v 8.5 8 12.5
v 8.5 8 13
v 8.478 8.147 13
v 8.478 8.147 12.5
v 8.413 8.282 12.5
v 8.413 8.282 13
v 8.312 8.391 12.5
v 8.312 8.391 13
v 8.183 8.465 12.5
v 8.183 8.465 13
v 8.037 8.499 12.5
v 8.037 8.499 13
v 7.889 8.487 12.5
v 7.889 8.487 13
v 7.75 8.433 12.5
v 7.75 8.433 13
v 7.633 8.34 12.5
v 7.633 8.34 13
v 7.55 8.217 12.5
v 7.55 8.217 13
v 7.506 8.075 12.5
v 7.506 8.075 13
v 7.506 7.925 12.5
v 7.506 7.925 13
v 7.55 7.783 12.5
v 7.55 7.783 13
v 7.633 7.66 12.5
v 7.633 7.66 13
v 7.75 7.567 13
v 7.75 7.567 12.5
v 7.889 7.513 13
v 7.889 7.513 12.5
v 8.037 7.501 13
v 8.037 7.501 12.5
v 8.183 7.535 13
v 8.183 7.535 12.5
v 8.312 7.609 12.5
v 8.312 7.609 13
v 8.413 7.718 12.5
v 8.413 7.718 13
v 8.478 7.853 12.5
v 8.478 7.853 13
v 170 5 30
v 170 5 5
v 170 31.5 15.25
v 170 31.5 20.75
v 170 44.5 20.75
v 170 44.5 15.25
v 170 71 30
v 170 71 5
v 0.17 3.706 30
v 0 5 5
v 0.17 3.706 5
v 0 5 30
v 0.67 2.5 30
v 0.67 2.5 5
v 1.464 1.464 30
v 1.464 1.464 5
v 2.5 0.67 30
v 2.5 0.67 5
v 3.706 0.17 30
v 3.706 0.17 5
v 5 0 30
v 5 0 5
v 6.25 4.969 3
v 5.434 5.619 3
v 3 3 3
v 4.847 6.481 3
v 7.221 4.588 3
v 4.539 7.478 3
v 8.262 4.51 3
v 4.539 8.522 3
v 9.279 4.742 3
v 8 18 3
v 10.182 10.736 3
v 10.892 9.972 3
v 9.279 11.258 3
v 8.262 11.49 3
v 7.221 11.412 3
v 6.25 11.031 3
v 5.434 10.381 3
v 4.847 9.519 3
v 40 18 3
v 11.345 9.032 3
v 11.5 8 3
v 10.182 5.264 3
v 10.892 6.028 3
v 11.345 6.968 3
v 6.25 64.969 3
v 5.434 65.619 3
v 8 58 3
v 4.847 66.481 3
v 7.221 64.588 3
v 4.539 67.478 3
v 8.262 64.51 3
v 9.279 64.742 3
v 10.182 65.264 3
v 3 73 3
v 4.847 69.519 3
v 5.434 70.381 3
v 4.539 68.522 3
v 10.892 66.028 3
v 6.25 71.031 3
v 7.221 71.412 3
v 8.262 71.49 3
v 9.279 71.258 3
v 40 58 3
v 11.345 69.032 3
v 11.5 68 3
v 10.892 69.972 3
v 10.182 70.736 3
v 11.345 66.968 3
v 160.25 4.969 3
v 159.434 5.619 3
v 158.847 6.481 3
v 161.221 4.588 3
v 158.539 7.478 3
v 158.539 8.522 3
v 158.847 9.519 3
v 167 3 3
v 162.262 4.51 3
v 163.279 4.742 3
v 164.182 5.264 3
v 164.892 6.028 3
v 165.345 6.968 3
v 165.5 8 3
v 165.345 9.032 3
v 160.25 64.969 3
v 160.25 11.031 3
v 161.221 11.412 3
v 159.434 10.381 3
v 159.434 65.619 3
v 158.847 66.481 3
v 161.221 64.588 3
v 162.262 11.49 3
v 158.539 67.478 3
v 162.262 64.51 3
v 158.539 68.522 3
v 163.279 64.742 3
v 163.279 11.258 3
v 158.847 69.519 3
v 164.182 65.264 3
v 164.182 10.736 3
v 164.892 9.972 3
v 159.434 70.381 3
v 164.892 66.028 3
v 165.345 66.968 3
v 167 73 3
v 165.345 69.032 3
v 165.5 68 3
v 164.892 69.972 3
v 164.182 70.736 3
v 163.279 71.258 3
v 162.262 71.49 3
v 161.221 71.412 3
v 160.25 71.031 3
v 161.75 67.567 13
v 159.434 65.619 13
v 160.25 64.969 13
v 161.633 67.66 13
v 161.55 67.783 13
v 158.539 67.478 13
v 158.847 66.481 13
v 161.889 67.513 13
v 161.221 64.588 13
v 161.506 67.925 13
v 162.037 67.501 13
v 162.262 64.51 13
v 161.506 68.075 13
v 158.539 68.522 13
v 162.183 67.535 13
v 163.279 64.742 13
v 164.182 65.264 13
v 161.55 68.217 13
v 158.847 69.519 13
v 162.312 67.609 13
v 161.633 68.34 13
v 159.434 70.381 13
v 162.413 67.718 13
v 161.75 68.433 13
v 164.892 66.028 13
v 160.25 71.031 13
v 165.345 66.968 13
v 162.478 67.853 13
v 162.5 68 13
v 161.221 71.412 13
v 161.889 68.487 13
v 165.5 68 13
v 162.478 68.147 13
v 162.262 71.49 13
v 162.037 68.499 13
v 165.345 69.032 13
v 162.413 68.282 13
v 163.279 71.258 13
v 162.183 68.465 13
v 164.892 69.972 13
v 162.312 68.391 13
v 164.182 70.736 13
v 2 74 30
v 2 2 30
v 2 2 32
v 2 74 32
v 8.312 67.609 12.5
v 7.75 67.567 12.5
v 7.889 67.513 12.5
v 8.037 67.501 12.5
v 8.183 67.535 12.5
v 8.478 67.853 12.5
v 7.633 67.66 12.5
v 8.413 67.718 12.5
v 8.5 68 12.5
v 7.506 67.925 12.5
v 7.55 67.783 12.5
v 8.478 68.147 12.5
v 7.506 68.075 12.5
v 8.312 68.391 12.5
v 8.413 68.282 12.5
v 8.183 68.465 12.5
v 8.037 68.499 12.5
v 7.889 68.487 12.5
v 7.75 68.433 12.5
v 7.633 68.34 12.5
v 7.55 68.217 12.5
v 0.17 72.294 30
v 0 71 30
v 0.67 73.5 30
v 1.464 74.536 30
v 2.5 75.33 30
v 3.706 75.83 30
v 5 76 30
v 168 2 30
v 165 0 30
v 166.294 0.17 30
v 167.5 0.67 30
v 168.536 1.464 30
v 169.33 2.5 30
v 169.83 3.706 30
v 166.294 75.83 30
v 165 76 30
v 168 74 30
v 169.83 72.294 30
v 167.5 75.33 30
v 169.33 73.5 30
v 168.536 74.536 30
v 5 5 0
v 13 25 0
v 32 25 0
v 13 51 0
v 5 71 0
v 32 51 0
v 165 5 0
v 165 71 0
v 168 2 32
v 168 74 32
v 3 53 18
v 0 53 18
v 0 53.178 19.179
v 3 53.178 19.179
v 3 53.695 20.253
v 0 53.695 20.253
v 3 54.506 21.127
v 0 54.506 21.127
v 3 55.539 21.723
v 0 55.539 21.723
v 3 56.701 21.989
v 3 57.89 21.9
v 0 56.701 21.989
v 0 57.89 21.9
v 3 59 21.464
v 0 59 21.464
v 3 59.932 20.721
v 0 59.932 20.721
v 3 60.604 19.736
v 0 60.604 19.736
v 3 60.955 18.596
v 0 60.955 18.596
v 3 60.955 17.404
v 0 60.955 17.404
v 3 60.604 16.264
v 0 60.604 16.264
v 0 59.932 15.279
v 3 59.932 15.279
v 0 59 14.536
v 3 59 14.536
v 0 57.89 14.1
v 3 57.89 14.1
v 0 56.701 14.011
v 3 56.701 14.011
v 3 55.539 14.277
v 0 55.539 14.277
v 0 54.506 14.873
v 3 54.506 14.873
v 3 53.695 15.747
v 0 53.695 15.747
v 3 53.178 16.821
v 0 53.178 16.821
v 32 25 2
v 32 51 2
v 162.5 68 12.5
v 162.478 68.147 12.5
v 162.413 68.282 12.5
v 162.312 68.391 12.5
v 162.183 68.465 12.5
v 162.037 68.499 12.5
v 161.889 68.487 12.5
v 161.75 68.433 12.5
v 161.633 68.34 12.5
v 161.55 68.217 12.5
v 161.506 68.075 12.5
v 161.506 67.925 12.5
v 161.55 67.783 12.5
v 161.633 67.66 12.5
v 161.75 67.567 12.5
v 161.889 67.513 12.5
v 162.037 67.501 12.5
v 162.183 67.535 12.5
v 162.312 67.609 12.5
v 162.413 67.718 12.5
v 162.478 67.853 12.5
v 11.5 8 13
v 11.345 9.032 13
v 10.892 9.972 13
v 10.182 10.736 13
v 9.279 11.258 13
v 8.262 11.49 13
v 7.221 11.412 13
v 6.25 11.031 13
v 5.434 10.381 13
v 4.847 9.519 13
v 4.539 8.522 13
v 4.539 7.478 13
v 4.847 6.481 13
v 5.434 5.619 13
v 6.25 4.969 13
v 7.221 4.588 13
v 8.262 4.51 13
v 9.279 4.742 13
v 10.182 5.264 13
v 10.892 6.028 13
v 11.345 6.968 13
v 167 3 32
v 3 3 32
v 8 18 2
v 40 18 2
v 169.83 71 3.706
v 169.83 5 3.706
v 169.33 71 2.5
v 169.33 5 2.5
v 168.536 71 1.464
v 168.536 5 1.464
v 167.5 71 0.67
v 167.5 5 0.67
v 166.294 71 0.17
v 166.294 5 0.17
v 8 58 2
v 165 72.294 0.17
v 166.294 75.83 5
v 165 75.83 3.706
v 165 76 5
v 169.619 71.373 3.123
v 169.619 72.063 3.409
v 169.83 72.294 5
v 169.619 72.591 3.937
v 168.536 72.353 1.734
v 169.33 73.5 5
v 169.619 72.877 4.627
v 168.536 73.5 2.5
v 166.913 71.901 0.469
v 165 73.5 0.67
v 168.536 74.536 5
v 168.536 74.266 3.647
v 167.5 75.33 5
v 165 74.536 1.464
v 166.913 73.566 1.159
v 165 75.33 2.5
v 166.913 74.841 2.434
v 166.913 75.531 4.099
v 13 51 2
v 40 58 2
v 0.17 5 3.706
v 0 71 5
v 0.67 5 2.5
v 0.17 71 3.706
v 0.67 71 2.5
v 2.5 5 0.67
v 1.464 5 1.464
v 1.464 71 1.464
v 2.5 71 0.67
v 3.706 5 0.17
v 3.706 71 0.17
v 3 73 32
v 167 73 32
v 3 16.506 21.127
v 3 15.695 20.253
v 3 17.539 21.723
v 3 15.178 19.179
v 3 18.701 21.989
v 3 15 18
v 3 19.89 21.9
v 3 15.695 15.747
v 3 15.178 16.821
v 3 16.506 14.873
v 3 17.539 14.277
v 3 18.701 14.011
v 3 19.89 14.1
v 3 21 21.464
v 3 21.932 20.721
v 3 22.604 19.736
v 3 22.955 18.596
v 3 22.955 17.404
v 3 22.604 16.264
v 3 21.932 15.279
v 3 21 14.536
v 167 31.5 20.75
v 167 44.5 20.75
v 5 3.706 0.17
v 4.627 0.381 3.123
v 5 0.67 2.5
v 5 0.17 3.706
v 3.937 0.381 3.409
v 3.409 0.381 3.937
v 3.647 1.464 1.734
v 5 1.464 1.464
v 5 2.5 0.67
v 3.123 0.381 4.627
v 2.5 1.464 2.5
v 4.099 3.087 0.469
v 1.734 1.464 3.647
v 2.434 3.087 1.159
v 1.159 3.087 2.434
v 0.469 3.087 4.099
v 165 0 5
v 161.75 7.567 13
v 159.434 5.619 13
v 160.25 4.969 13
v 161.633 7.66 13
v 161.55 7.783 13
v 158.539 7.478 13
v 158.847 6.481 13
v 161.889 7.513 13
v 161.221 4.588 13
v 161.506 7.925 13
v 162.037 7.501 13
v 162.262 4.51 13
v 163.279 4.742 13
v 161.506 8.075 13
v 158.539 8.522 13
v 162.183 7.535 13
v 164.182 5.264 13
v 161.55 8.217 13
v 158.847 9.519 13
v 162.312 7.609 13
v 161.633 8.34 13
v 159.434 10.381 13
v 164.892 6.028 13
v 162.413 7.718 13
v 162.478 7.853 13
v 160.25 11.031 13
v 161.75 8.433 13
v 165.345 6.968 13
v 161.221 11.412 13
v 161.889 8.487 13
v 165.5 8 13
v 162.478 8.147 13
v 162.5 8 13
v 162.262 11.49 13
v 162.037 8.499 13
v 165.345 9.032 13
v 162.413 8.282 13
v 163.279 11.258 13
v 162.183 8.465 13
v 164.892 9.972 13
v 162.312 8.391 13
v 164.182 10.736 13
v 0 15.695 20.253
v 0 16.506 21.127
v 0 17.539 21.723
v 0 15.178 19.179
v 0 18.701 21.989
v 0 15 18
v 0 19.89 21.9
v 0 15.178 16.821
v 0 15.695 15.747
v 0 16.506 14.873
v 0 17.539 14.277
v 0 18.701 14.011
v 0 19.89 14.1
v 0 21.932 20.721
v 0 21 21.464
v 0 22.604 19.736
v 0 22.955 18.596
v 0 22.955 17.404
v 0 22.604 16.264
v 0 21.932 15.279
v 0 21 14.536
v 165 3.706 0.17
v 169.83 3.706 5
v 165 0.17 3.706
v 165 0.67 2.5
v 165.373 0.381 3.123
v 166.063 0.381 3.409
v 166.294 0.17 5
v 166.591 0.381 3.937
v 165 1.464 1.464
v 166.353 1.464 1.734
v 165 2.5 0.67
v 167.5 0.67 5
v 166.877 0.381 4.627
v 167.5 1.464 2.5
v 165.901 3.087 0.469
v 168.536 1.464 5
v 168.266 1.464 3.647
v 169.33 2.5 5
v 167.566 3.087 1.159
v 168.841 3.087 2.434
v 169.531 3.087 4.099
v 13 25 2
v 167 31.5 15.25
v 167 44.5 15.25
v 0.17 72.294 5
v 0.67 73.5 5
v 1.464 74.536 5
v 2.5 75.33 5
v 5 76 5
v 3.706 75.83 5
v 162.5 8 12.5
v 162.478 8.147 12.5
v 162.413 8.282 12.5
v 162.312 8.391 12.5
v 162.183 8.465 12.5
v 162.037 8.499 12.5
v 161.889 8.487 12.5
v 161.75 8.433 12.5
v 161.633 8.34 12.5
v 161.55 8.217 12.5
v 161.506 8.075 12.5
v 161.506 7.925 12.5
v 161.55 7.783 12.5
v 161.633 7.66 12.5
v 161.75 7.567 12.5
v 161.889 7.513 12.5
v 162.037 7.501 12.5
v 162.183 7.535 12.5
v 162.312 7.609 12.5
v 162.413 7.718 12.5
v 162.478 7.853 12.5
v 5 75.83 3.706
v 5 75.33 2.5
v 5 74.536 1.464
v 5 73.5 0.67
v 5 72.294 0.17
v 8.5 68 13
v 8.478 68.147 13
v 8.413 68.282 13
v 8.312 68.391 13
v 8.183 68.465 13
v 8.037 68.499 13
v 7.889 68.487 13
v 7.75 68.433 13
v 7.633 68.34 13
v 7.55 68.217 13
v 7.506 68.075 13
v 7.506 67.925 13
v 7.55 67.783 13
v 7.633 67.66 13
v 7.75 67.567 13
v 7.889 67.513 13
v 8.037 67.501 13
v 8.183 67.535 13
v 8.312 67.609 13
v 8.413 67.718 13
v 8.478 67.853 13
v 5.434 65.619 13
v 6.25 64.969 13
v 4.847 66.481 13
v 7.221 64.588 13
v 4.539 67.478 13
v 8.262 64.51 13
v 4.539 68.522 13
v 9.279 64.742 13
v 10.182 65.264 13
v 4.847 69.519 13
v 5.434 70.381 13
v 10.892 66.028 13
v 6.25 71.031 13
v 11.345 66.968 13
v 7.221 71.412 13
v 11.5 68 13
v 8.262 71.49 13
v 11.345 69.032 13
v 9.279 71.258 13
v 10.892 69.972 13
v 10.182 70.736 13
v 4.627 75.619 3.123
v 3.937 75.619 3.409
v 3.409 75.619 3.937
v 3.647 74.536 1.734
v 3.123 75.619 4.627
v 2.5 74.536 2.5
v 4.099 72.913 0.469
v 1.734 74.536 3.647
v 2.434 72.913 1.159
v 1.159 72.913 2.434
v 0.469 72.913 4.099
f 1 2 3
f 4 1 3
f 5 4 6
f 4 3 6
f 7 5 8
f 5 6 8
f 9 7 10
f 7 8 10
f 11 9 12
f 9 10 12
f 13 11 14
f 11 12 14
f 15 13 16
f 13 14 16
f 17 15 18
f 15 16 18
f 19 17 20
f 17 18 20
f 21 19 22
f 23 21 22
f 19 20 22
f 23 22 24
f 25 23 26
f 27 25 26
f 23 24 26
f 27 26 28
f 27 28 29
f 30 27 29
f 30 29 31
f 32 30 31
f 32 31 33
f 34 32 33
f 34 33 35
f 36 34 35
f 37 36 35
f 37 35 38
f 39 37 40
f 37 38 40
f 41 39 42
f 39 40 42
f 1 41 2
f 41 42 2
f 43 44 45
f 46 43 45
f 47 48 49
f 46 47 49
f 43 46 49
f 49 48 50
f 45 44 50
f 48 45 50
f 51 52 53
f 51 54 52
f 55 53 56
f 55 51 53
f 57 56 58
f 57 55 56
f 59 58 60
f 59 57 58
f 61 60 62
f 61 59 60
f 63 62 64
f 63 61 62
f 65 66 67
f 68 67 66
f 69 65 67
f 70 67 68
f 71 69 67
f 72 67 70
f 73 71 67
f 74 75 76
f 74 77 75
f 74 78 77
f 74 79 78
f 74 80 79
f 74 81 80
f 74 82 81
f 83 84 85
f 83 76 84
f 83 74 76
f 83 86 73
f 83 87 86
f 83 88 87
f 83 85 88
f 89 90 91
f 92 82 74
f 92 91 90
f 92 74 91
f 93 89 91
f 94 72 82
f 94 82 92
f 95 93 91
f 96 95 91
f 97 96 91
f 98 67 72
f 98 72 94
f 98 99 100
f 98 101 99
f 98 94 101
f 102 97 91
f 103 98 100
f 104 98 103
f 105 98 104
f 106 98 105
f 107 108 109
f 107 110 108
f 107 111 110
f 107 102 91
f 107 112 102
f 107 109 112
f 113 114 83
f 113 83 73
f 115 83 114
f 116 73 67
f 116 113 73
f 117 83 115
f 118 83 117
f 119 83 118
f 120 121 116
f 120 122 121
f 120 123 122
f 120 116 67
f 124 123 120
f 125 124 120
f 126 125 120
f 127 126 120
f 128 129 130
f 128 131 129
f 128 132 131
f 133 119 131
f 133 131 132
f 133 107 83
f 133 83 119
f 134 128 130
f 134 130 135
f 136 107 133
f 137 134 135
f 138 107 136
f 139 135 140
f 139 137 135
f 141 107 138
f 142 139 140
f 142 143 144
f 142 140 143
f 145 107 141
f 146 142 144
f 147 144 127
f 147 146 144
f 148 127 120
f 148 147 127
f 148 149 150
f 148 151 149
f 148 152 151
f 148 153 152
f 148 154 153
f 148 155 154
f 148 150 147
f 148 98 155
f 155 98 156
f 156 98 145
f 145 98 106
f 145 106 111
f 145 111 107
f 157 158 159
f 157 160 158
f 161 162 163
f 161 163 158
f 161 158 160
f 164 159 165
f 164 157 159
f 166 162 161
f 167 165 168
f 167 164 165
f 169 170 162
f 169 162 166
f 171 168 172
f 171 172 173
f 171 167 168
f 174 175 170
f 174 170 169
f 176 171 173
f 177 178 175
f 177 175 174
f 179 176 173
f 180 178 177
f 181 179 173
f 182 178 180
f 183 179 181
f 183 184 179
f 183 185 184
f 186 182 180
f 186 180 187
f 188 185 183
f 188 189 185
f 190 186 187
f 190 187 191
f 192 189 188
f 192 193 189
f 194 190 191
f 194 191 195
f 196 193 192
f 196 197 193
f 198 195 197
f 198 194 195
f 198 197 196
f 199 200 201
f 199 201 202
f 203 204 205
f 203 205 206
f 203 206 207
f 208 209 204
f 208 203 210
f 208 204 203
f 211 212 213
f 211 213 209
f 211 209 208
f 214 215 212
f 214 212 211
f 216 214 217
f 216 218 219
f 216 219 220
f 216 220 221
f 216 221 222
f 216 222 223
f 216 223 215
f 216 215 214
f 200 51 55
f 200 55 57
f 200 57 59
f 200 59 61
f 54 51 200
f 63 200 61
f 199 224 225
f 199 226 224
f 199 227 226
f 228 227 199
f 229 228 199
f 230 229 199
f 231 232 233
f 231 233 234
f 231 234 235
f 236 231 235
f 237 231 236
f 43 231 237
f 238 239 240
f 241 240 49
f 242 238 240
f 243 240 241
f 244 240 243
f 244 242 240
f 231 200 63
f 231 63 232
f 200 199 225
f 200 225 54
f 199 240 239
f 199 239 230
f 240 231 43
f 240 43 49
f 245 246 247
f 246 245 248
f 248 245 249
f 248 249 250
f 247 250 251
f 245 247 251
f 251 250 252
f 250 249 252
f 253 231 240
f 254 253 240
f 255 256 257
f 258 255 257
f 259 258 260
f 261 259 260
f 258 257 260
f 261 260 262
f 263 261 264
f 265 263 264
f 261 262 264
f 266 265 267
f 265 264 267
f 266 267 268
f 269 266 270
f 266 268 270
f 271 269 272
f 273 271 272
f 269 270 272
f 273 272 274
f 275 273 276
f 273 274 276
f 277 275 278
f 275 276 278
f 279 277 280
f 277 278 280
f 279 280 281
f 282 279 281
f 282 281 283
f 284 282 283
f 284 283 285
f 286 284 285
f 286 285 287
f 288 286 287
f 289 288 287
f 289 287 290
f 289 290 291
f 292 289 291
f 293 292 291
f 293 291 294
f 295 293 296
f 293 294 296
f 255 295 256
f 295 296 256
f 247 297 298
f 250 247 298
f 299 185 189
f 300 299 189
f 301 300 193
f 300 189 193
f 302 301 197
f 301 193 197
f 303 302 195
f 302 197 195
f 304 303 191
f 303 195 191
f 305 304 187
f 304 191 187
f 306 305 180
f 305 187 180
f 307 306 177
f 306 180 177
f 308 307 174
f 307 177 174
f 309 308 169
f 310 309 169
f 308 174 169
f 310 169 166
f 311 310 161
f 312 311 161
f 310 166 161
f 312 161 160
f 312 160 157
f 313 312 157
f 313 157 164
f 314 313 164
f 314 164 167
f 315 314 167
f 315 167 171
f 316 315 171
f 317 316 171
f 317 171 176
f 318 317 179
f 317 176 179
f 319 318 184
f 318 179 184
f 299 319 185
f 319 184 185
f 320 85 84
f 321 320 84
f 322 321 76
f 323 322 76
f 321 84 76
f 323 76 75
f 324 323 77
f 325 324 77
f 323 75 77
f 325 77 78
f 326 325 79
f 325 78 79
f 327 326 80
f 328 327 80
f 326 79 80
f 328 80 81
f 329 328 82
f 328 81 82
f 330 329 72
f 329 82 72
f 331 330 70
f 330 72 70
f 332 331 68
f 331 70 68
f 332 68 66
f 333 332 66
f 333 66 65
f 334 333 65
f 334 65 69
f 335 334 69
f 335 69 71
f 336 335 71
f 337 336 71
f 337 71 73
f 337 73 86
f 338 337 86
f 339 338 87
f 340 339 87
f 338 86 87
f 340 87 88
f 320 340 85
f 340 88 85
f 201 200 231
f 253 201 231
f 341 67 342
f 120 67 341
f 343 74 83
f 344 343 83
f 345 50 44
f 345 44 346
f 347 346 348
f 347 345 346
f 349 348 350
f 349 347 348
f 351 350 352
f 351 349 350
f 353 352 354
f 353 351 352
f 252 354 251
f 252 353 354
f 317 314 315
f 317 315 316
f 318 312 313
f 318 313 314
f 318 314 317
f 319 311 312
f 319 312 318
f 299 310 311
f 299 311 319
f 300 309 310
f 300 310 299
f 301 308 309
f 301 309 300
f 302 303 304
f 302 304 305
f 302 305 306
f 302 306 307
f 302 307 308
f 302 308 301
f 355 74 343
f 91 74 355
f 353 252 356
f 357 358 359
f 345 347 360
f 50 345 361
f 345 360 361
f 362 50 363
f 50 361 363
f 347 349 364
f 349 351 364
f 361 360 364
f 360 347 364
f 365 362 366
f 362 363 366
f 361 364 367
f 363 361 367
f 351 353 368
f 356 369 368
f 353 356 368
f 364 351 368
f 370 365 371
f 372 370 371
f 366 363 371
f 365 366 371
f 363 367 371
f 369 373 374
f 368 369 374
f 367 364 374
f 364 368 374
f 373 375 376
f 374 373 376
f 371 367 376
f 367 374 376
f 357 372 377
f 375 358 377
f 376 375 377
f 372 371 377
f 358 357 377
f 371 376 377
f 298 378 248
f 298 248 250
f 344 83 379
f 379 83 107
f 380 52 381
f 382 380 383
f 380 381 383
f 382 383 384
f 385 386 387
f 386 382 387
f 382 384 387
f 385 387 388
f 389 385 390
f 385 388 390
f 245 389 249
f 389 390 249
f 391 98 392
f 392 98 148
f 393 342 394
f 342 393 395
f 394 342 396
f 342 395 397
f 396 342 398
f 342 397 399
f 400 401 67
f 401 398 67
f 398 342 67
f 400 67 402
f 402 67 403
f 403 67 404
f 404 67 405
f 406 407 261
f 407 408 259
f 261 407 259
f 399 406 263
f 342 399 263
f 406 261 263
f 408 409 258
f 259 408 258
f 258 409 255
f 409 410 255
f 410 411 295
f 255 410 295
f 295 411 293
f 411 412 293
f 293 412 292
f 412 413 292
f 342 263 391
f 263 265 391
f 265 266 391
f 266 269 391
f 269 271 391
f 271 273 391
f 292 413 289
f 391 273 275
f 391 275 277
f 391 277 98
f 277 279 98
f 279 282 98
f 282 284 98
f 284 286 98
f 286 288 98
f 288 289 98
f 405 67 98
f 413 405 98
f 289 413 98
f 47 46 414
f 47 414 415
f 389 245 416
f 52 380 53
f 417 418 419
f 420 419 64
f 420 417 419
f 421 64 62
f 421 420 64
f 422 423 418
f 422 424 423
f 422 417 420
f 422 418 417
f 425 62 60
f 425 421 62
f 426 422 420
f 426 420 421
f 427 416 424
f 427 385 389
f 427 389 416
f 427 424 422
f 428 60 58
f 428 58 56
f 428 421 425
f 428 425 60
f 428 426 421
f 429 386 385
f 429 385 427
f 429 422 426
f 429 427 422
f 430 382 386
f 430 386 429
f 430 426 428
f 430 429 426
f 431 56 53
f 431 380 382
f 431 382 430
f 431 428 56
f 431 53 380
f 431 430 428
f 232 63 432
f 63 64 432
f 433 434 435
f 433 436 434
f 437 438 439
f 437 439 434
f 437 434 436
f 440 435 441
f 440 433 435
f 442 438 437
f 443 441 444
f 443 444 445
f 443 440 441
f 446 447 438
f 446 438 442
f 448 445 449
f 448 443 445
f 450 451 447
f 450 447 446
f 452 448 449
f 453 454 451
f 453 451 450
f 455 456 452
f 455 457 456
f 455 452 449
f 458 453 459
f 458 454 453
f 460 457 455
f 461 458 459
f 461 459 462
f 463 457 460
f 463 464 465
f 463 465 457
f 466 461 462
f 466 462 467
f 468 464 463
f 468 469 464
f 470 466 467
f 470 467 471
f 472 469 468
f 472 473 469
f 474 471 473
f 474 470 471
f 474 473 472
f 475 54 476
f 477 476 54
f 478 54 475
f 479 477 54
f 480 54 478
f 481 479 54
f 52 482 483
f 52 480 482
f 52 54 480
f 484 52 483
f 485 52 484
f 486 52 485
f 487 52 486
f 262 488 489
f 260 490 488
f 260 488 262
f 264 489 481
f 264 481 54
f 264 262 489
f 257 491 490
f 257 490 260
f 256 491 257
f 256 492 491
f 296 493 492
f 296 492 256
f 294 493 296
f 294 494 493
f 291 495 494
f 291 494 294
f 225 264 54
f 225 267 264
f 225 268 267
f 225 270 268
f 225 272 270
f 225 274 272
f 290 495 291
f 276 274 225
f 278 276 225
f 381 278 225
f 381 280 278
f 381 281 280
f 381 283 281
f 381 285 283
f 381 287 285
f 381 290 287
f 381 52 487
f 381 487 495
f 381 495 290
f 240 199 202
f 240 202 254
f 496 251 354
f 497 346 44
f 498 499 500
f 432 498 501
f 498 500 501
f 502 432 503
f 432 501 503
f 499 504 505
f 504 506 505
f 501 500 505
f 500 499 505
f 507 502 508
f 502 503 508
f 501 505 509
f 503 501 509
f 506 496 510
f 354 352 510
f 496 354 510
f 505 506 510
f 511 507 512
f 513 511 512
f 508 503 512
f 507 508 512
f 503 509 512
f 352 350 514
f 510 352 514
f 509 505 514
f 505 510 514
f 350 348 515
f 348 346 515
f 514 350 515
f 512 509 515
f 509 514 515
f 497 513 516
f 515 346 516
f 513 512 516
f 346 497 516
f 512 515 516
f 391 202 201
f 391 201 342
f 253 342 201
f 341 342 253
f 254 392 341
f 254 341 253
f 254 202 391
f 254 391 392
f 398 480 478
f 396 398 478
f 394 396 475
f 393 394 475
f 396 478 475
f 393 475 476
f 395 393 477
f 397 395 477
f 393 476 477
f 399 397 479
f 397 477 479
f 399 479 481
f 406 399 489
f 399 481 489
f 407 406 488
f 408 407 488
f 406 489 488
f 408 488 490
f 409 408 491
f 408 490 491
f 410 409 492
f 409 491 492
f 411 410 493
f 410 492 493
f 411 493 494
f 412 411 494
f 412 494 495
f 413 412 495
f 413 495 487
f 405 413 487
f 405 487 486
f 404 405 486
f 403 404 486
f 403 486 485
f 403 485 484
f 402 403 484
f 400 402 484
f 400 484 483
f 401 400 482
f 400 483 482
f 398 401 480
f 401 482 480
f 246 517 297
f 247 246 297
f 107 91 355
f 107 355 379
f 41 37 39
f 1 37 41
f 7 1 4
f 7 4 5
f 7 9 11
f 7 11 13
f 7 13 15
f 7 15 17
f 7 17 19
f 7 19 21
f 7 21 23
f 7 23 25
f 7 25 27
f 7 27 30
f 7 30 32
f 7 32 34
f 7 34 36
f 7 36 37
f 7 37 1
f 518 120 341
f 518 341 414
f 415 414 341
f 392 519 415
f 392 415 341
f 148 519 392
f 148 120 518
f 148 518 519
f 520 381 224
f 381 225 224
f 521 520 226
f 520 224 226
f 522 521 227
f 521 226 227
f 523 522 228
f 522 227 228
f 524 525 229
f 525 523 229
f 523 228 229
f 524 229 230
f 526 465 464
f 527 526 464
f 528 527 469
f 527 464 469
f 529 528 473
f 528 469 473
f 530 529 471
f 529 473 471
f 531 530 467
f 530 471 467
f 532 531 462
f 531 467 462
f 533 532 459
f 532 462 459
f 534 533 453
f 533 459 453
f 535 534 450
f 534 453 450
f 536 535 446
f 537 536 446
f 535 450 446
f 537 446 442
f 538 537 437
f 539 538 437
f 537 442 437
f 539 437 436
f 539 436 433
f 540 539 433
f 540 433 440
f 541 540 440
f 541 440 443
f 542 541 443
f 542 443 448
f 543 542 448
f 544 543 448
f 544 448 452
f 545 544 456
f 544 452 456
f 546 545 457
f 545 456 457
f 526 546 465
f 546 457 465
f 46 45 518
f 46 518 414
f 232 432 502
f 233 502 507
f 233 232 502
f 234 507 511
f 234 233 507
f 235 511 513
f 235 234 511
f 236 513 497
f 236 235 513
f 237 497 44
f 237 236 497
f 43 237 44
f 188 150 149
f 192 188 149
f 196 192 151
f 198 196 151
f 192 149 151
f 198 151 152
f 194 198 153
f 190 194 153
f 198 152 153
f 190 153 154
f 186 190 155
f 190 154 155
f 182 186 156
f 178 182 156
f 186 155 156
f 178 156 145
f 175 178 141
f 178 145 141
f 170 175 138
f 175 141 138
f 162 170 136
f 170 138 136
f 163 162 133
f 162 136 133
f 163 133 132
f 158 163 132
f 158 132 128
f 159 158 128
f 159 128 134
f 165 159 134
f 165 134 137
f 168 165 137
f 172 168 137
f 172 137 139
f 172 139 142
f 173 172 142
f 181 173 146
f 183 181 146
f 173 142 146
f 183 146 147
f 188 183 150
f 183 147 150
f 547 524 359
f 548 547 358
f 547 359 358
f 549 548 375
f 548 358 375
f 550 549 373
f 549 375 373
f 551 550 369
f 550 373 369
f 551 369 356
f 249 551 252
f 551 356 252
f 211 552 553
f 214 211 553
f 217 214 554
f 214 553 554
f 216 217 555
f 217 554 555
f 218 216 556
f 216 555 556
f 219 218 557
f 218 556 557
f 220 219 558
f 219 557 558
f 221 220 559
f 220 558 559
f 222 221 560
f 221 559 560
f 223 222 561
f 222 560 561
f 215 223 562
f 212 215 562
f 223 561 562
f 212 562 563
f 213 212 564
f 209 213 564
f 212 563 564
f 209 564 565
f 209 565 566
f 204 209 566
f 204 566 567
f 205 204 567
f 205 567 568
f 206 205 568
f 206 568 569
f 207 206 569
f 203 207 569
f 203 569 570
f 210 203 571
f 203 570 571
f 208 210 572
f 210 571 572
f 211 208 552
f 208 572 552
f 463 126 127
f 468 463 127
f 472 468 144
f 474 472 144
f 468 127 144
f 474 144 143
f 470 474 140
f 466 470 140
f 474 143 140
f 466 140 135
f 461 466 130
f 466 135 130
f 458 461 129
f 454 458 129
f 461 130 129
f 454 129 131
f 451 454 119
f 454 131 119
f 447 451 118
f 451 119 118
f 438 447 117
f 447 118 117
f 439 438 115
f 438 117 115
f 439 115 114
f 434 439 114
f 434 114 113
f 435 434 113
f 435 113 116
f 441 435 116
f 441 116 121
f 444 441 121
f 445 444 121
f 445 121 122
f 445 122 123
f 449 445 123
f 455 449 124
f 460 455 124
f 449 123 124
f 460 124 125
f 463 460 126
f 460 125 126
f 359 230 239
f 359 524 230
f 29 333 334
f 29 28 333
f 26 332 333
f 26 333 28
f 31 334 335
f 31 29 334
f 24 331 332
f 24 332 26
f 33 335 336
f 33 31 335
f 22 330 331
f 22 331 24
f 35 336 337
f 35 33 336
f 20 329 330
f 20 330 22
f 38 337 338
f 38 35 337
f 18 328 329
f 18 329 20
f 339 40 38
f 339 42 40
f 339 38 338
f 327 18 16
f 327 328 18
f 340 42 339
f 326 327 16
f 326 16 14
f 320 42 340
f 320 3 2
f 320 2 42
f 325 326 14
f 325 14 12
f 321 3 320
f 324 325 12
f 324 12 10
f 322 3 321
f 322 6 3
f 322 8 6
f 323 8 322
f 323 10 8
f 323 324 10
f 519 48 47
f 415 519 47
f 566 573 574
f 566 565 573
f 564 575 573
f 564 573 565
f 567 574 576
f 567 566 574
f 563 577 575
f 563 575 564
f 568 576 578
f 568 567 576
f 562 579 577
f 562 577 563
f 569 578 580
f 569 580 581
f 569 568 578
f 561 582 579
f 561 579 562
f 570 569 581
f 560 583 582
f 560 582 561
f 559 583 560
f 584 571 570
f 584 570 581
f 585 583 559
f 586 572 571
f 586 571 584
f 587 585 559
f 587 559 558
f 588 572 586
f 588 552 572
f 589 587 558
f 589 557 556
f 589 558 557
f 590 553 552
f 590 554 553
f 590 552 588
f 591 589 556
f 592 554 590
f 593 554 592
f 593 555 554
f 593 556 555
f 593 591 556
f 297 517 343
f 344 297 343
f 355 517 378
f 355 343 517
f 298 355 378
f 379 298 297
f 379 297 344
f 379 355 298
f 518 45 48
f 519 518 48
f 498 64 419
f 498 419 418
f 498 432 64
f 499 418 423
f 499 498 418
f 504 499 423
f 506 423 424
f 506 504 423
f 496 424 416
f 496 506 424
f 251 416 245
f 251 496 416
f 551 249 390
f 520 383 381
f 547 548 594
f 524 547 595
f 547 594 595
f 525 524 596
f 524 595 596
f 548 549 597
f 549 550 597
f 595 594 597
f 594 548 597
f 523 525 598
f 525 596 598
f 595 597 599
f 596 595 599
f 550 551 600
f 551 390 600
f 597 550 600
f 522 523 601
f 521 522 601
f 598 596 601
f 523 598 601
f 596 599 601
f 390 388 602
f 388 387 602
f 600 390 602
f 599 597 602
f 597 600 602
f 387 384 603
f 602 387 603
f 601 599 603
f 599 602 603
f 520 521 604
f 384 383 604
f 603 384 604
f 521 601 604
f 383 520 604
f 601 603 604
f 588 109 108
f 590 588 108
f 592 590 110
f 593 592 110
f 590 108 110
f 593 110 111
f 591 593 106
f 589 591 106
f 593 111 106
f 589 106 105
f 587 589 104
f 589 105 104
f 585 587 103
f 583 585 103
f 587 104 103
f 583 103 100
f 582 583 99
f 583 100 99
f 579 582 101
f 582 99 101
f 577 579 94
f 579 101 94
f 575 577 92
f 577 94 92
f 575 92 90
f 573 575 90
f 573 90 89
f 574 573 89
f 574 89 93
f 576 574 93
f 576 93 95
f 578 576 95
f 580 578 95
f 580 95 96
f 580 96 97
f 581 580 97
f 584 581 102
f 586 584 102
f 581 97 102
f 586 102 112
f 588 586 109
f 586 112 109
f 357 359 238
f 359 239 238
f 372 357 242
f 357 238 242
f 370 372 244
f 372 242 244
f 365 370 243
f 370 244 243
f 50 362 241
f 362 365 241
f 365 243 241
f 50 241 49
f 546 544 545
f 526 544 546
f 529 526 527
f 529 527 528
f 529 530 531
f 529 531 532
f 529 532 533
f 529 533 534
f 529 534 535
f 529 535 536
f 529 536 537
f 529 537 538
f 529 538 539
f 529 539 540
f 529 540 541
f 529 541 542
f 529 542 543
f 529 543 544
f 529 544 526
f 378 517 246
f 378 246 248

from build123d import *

# Parameters (mm, degrees)
F0_W      = 170
F0_H      = 76
F1_DEPTH  = 30
F2_W      = 164
F2_H      = 70
F3_DEPTH  = 27
F6_W      = 166
F6_H      = 72
F6_W_2    = 164
F6_H_2    = 70
F7_DEPTH  = 2
F5_R      = 4
F9_DEPTH  = 3
F8_R      = 3.5
F10_DEPTH = 10
F11_R     = 0.5
F12_DEPTH = 0.5
F13_W     = 13
F13_H     = 5.5
F14_DEPTH = 3
F15_R     = 5
F16_W     = 19
F16_H     = 26
F17_DEPTH = 25
F18_W     = 32
F18_H     = 40
F18_W_2   = 19
F18_H_2   = 26
F19_DEPTH = 1


with BuildPart() as f1:
    # F0 (on Top) → F1 (new body)
    with BuildSketch(Plane.XY):
        with Locations((85, 38)):
            Rectangle(F0_W, F0_H)
    extrude(amount=F1_DEPTH)

    # F2 (on face) → F3 (cut)
    with BuildSketch(Plane.XY.offset(30)):
        with Locations((85, 38)):
            Rectangle(F2_W, F2_H)
    extrude(amount=-F3_DEPTH, mode=Mode.SUBTRACT)

    # F6 (on face) → F7 (join)
    with BuildSketch(Plane.XY.offset(30)):
        with Locations((85, 38)):
            Rectangle(F6_W, F6_H)
        with Locations((85, 38)):
            Rectangle(F6_W_2, F6_H_2, mode=Mode.SUBTRACT)
    extrude(amount=F7_DEPTH)

    # F5 (on face) → F9 (cut, through all)
    with BuildSketch(Plane(origin=(0, 0, 0), x_dir=(0, -1, 0), z_dir=(-1, 0, 0))):
        with Locations((-57, 18)):
            Circle(F5_R)
        with Locations((-19, 18)):
            Circle(F5_R)
    extrude(amount=-F9_DEPTH, mode=Mode.SUBTRACT)

    # F8 (on face) → F10 (join)
    with BuildSketch(Plane.XY.offset(3)):
        with Locations((8, 68)):
            Circle(F8_R)
        with Locations((8, 8)):
            Circle(F8_R)
        with Locations((162, 8)):
            Circle(F8_R)
        with Locations((162, 68)):
            Circle(F8_R)
    extrude(amount=F10_DEPTH)

    # F11 (on face) → F12 (cut)
    with BuildSketch(Plane.XY.offset(13)):
        with Locations((162, 8)):
            Circle(F11_R)
        with Locations((8, 8)):
            Circle(F11_R)
        with Locations((8, 68)):
            Circle(F11_R)
        with Locations((162, 68)):
            Circle(F11_R)
    extrude(amount=-F12_DEPTH, mode=Mode.SUBTRACT)

    # F13 (on face) → F14 (cut, through all)
    with BuildSketch(Plane.YZ.offset(170)):
        with Locations((38, 18)):
            Rectangle(F13_W, F13_H)
    extrude(amount=-F14_DEPTH, mode=Mode.SUBTRACT)

    # F15
    f15_edges = [f1.edges().sort_by_distance(p)[0] for p in [
        (0, 38, 0),
        (85, 76, 0),
        (170, 38, 0),
        (85, 0, 0),
        (170, 76, 15),
        (170, 0, 15),
        (0, 76, 15),
        (0, 0, 15),
    ]]
    fillet(f15_edges, radius=F15_R)

    # F16 (on face) → F17 (cut)
    with BuildSketch(Plane.XY.offset(3)):
        with Locations((22.5, 38)):
            Rectangle(F16_W, F16_H)
    extrude(amount=-F17_DEPTH, mode=Mode.SUBTRACT)

    # F18 (on face) → F19 (cut)
    with BuildSketch(Plane.XY.offset(3)):
        with Locations((24, 38)):
            Rectangle(F18_W, F18_H)
        with Locations((22.5, 38)):
            Rectangle(F18_W_2, F18_H_2, mode=Mode.SUBTRACT)
    extrude(amount=-F19_DEPTH, mode=Mode.SUBTRACT)


solid = f1.part
